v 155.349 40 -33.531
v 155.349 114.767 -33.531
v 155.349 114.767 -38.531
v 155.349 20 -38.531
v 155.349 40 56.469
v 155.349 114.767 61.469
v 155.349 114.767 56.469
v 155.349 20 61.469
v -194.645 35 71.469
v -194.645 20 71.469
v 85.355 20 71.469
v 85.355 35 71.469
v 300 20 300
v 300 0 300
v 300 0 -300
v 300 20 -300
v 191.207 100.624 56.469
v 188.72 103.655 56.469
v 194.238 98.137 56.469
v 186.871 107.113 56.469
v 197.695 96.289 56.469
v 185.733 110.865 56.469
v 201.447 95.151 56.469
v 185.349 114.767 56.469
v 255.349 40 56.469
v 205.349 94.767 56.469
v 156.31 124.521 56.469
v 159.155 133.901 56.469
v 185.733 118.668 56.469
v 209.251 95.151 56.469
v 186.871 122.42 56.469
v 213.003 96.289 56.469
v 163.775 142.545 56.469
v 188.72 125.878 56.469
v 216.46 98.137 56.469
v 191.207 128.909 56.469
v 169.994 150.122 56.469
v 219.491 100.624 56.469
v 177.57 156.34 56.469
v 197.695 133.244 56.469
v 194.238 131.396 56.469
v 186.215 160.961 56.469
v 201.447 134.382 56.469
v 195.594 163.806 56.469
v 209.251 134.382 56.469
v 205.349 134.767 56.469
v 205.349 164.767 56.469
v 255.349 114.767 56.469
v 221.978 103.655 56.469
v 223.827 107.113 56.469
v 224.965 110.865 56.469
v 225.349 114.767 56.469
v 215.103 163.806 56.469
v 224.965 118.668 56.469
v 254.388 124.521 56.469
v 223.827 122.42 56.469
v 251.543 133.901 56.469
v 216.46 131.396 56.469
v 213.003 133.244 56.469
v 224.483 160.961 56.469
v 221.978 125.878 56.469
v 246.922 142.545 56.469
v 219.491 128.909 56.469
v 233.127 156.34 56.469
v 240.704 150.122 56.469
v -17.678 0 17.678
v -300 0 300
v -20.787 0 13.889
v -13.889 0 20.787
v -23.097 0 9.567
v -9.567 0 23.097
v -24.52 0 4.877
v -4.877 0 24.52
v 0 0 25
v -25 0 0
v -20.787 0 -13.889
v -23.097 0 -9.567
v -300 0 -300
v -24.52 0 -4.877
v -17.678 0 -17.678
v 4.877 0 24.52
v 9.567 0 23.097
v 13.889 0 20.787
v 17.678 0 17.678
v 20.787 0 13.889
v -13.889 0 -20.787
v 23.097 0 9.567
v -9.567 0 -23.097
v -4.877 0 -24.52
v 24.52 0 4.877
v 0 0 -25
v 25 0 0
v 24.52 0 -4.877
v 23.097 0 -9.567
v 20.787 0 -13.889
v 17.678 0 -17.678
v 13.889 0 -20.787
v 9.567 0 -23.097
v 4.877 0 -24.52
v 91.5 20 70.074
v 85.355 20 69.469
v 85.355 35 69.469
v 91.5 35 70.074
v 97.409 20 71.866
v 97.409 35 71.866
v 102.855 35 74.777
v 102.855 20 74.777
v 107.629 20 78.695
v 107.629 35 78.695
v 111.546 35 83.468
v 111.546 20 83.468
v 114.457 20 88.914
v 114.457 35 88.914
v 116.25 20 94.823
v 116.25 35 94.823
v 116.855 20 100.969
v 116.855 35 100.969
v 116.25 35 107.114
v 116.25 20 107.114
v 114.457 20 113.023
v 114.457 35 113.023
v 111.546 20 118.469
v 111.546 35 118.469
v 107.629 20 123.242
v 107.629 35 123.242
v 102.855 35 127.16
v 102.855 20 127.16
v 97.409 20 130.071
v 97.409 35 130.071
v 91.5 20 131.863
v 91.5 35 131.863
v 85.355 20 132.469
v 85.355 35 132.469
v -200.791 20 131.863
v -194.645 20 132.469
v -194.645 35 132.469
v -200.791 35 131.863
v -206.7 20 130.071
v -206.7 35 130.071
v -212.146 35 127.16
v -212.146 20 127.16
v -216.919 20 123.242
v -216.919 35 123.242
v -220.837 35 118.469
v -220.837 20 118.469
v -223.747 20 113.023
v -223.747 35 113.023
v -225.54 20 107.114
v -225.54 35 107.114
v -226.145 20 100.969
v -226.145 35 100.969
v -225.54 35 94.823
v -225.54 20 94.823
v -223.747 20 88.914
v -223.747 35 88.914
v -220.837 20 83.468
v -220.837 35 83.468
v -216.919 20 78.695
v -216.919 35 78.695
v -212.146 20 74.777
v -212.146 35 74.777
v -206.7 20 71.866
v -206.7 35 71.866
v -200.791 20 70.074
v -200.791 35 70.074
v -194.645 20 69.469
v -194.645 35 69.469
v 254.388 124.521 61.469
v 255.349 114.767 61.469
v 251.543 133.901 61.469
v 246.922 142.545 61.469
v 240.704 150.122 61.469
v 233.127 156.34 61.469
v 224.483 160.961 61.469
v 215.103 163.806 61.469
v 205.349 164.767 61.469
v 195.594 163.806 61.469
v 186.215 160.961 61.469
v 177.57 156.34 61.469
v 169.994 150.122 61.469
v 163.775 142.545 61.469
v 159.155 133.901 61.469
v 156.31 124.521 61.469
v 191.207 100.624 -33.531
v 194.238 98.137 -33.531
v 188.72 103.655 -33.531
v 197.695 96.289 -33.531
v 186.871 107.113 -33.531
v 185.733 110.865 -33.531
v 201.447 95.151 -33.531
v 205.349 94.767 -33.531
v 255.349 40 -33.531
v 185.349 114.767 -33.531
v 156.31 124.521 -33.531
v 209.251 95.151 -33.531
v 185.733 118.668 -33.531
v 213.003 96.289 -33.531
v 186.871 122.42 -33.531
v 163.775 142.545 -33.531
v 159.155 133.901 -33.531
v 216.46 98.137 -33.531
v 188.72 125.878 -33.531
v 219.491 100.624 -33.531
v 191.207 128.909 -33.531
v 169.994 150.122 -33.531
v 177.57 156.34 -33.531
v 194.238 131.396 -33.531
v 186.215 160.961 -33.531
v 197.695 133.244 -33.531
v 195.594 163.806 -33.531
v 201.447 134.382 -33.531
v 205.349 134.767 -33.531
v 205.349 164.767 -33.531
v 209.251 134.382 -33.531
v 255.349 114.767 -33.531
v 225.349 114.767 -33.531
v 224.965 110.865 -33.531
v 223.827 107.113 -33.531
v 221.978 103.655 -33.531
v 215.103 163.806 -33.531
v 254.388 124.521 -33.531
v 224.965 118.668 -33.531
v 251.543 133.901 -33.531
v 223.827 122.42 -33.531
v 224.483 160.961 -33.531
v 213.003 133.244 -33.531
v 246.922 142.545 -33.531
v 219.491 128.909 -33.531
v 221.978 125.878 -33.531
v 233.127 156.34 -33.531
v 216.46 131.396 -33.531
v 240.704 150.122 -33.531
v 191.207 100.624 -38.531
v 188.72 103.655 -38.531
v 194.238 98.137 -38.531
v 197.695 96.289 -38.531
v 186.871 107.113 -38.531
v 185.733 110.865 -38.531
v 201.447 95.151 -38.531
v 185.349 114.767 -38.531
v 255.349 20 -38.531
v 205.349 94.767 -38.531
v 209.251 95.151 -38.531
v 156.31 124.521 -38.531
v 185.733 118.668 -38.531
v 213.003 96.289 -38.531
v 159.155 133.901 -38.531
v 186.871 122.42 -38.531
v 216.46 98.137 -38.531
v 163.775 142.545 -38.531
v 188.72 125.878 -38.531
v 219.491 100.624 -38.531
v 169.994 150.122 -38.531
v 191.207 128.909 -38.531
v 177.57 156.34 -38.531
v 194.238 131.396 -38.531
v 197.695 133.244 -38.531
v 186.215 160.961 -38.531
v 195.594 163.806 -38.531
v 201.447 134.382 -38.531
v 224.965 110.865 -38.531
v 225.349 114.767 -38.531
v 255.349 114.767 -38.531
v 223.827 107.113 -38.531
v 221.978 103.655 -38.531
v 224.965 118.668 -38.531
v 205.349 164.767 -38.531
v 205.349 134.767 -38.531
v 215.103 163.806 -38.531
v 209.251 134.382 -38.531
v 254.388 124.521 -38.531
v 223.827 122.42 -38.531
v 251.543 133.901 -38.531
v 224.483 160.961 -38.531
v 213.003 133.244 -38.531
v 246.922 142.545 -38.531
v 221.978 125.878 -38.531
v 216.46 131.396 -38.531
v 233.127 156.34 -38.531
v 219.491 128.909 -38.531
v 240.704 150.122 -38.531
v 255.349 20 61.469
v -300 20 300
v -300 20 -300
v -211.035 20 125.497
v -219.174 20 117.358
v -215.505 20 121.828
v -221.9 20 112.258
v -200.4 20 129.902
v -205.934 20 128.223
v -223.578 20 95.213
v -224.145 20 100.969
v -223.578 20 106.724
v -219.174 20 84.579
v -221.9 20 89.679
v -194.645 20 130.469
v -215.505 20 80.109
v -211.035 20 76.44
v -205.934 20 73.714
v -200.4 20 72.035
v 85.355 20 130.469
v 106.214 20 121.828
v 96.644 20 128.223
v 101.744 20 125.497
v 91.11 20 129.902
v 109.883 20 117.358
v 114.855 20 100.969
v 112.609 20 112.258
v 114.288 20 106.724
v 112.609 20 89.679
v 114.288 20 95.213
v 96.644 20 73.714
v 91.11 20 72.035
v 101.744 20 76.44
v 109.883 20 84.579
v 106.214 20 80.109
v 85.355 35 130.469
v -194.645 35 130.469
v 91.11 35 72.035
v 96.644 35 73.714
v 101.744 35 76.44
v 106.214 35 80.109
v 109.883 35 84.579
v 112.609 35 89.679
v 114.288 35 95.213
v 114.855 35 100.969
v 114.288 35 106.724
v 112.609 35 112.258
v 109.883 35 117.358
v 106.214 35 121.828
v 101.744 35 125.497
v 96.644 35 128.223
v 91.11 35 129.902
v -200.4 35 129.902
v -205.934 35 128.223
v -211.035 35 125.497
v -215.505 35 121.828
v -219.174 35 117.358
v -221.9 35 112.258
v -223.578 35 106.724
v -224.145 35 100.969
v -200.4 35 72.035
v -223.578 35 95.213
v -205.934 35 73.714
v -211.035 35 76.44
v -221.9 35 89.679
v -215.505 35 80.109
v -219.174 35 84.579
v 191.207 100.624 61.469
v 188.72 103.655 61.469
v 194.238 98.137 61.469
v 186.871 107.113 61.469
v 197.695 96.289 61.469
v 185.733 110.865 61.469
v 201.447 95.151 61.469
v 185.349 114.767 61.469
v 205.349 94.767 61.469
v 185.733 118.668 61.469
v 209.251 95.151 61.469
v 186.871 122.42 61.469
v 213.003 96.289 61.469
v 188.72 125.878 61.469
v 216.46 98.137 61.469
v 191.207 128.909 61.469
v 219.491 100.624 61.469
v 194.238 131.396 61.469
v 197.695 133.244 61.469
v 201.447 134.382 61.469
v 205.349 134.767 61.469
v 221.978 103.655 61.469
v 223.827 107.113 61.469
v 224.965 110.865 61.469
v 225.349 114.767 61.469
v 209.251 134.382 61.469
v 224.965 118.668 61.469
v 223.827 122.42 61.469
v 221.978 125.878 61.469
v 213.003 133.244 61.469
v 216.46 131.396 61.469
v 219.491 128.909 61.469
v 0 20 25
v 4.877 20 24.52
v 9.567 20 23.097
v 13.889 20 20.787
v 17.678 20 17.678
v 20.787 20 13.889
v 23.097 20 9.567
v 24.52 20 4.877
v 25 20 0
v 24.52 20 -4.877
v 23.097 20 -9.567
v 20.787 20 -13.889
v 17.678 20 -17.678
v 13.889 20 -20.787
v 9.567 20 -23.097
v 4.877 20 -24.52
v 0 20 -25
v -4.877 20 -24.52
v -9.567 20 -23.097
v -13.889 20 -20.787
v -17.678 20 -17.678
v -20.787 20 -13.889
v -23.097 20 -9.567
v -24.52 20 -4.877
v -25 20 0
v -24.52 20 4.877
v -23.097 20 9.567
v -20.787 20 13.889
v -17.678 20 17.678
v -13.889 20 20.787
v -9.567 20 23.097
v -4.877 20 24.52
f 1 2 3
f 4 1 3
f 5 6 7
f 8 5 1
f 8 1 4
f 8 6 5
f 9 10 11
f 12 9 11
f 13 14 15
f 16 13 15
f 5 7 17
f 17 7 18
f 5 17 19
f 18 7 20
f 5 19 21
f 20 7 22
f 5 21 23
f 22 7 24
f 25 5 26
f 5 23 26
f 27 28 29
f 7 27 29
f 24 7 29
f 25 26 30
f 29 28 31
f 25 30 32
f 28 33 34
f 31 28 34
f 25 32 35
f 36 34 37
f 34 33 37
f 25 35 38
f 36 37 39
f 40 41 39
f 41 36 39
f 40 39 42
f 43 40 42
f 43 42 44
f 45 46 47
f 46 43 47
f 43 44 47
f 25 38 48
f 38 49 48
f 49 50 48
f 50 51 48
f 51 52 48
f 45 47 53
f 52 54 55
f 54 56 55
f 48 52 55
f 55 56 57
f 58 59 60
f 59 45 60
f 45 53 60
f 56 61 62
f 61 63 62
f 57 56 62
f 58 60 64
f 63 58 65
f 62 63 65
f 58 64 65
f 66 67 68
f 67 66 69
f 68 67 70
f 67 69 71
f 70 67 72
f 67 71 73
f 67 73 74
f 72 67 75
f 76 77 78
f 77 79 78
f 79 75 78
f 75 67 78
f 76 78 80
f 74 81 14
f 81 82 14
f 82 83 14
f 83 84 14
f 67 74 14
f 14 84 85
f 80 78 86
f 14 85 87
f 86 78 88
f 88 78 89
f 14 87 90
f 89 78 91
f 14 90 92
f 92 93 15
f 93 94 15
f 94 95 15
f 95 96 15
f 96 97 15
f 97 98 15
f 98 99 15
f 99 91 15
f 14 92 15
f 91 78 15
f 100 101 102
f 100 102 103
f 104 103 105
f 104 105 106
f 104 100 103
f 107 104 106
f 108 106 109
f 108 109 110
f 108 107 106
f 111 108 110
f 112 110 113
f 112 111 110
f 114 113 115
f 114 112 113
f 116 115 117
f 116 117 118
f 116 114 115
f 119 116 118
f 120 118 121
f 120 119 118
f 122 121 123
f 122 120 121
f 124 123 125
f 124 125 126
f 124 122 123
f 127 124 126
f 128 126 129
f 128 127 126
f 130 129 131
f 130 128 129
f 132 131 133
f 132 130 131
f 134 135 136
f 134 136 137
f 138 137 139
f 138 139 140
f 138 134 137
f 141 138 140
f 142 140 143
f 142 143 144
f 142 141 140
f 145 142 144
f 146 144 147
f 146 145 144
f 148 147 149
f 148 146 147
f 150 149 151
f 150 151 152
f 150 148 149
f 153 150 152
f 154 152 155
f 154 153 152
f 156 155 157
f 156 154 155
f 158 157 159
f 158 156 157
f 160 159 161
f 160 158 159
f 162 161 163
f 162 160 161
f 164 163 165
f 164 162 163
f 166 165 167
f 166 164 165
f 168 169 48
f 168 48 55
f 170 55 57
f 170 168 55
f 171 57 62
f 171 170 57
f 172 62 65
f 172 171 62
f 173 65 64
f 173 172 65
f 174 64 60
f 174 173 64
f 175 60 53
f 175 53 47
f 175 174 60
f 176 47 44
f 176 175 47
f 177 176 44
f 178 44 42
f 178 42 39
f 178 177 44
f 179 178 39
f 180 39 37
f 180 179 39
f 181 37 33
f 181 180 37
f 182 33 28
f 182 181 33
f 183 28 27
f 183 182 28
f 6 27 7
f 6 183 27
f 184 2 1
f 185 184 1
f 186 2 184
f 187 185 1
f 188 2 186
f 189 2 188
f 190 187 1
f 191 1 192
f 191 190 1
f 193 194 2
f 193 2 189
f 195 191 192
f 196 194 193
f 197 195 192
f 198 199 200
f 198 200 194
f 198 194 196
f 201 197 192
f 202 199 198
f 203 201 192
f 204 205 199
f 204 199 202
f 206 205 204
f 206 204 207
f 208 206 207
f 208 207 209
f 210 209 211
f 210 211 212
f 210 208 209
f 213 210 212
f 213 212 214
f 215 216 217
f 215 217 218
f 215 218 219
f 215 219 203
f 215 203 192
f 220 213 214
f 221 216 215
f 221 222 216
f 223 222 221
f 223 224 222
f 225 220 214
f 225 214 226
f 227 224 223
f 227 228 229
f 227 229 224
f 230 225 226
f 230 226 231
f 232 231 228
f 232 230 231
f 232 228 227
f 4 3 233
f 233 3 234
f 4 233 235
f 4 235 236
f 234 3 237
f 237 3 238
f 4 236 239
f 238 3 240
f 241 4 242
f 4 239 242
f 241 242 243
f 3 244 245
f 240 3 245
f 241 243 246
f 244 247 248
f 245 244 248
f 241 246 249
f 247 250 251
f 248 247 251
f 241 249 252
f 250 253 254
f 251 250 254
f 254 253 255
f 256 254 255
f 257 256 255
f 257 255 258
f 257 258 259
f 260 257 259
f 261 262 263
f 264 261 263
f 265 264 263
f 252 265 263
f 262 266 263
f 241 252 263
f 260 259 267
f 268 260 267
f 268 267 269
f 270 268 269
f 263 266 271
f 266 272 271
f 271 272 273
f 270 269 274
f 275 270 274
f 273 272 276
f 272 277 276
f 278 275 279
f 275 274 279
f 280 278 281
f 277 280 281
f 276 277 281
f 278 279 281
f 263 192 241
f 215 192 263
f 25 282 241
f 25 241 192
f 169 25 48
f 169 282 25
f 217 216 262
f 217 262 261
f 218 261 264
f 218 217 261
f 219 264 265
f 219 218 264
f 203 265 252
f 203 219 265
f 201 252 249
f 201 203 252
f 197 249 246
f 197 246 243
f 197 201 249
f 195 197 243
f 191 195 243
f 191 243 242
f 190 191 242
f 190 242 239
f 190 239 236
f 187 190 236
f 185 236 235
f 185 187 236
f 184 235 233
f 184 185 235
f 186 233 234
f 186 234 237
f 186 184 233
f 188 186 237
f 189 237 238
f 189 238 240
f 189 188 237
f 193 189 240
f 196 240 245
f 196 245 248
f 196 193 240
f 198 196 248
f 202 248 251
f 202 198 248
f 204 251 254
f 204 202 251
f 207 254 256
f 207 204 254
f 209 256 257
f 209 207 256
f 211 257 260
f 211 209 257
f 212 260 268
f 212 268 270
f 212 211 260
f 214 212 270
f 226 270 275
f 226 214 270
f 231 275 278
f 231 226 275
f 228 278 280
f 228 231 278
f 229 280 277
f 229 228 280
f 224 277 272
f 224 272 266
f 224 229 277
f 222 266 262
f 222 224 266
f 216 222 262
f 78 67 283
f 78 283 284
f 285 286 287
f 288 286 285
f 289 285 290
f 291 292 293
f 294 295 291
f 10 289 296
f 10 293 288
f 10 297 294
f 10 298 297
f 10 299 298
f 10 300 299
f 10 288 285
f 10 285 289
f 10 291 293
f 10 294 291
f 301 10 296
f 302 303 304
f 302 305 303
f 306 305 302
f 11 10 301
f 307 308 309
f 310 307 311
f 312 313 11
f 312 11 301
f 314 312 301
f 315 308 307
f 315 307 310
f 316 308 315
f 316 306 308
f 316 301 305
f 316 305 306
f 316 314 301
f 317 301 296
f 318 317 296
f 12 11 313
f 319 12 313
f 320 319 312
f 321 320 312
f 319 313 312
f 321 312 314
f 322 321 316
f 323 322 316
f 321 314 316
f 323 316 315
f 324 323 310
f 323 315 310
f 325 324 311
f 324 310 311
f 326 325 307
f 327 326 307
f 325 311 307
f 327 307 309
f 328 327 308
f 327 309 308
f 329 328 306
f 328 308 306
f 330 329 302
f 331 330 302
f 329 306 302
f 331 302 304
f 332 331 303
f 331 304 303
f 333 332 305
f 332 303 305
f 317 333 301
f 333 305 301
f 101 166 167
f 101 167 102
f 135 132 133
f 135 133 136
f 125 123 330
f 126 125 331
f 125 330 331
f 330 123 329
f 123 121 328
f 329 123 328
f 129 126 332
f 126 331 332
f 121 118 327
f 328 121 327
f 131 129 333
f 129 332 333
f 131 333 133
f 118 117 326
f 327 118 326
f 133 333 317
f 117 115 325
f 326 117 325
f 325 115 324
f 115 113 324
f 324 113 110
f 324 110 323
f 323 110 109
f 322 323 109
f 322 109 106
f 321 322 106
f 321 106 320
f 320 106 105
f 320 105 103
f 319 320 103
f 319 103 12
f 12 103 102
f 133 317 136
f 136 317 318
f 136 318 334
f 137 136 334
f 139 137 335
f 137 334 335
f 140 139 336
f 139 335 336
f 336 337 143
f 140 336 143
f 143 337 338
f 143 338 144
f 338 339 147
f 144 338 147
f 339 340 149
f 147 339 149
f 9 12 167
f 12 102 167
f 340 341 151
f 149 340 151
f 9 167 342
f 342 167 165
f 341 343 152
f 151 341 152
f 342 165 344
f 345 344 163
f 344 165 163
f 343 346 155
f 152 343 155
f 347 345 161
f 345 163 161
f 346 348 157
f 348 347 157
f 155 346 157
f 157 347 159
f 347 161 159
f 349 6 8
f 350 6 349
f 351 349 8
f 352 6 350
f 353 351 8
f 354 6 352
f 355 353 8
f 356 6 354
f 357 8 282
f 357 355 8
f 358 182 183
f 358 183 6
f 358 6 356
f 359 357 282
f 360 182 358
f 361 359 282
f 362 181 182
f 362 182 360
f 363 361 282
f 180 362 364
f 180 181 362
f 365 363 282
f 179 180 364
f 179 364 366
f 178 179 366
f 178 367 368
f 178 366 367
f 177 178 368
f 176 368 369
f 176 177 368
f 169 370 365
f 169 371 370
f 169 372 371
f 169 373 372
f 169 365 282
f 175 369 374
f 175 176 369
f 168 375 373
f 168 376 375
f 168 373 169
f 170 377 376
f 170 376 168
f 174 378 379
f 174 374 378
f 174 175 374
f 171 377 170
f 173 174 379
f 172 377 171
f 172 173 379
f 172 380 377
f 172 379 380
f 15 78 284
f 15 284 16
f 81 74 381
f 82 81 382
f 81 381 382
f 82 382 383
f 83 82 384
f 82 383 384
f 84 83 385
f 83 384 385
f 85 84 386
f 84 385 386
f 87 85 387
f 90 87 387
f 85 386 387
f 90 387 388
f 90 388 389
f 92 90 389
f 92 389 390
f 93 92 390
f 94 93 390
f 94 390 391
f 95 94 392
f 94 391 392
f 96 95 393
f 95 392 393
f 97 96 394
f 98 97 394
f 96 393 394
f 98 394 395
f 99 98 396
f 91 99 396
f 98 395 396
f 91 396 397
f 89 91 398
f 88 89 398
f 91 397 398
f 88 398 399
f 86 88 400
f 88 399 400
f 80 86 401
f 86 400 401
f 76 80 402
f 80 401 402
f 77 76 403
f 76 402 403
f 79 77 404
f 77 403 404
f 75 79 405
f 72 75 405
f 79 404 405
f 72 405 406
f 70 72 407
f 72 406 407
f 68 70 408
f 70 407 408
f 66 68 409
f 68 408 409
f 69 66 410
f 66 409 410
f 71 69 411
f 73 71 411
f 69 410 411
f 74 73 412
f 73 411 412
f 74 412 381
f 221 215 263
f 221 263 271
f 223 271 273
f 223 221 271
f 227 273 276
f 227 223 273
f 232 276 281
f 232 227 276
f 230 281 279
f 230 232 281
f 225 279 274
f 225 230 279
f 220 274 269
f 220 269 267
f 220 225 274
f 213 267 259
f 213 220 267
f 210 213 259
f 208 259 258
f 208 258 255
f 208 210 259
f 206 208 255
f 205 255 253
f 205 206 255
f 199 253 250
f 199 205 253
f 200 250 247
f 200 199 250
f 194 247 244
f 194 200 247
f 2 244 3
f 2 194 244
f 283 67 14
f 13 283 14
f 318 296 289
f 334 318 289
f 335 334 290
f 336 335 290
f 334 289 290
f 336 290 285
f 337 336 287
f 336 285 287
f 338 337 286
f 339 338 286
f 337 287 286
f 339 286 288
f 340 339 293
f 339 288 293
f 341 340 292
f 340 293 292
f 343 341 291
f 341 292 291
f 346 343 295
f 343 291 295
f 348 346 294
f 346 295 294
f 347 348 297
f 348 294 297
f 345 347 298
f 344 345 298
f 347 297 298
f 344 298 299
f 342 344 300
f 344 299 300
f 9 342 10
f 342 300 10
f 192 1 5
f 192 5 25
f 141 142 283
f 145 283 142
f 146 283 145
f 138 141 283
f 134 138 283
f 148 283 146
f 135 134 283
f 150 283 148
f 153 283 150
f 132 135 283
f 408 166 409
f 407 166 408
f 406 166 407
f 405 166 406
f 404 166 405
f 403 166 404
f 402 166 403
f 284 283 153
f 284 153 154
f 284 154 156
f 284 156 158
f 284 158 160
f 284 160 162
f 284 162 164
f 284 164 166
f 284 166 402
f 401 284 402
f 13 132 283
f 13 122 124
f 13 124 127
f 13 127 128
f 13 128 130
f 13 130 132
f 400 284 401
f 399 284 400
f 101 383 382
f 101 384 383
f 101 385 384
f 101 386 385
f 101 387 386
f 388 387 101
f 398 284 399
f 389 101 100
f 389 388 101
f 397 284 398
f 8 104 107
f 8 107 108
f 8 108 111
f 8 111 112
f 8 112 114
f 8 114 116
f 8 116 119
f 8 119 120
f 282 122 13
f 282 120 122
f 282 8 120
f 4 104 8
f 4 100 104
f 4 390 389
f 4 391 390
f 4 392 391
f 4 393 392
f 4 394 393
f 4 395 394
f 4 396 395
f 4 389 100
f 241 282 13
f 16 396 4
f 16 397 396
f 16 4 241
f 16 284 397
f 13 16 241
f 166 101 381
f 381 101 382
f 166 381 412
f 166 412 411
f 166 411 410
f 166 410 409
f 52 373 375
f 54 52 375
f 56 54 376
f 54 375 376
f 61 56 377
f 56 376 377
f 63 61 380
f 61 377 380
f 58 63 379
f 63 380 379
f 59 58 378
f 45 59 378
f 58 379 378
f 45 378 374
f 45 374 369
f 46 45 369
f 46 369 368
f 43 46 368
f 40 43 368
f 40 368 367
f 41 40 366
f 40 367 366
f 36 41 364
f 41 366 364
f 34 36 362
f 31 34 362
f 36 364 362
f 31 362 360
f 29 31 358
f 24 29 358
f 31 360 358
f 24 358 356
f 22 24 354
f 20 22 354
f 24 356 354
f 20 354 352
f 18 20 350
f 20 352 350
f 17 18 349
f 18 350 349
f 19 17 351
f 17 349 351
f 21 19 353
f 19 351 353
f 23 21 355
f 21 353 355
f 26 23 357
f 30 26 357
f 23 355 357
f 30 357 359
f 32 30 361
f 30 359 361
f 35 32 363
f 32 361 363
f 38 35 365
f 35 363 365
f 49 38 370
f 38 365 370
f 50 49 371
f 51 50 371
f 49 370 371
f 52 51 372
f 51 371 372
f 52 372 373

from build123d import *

# Parameters (mm, degrees)
SKETCH_1_W          = 600
SKETCH_1_H          = 600
EXTRUDE_1_DEPTH     = 20
SKETCH_2_W          = 100
SKETCH_2_H          = 100
EXTRUDE_2_DEPTH     = 20
SKETCH_3_R          = 20
EXTRUDE_3_DEPTH     = 5
EXTRUDE_START       = -5
SKETCH_5_R          = 20
EXTRUDE_4_DEPTH     = 5
EXTRUDE_1_2_DEPTH   = 15
SKETCH_7_R          = 25
CUT_EXTRUDE_1_DEPTH = 20


with BuildPart() as part:
    # 草图1 → Extrude 1 (new body)
    with BuildSketch(Plane(origin=(0, 0, 0), x_dir=(1, 0, 0), z_dir=(0, 1, 0))):
        Rectangle(SKETCH_1_W, SKETCH_1_H)
    extrude(amount=EXTRUDE_1_DEPTH)

    # 草图2 → 凸台-拉伸2 (add)
    with BuildSketch(Plane(origin=(0, 20, 0), x_dir=(1, 0, 0), z_dir=(0, 1, 0))):
        with Locations((205.348971612, -11.468548329)):
            Rectangle(SKETCH_2_W, SKETCH_2_H)
    extrude(amount=EXTRUDE_2_DEPTH)

    # 草图3 → 凸台-拉伸3 (add)
    with BuildSketch(Plane.XY.offset(61.468548329)):
        with BuildLine():
            Line((255.348971612, 40), (255.348971612, 114.766543298))
            ThreePointArc((255.348971612, 114.766543298), (205.348971612, 164.766543298), (155.348971612, 114.766543298))
            Line((155.348971612, 114.766543298), (155.348971612, 40))
            Line((155.348971612, 40), (255.348971612, 40))
        make_face()
        with Locations((205.348971612, 114.766543298)):
            Circle(SKETCH_3_R, mode=Mode.SUBTRACT)
    extrude(amount=-EXTRUDE_3_DEPTH)

    # 草图5 → 凸台-拉伸4 (add)
    with BuildSketch(Plane(origin=(0, 0, -38.531451671), x_dir=(-1, 0, 0), z_dir=(0, 0, -1)).offset(EXTRUDE_START)):
        with BuildLine():
            ThreePointArc((-255.348971612, 114.766543298), (-205.348971612, 164.766543298), (-155.348971612, 114.766543298))
            Line((-155.348971612, 114.766543298), (-155.348971612, 40))
            Line((-155.348971612, 40), (-255.348971612, 40))
            Line((-255.348971612, 40), (-255.348971612, 114.766543298))
        make_face()
        with Locations(Location((-205.348971612, 114.766543298, 0), (0, 0, 180))):
            Circle(SKETCH_5_R, mode=Mode.SUBTRACT)
    extrude(amount=EXTRUDE_4_DEPTH)

    # 草图6 → Extrude 1 2 (add)
    with BuildSketch(Plane(origin=(0, 20, 0), x_dir=(1, 0, 0), z_dir=(0, 1, 0))):
        with BuildLine():
            Line((-194.645221659, -69.468548329), (85.354778341, -69.468548329))
            ThreePointArc((85.354778341, -69.468548329), (116.854778341, -100.968548329), (85.354778341, -132.468548329))
            Line((85.354778341, -132.468548329), (-194.645221659, -132.468548329))
            ThreePointArc((-194.645221659, -132.468548329), (-226.145221659, -100.968548329), (-194.645221659, -69.468548329))
        make_face()
        with BuildLine():
            Line((-194.645221659, -71.468548329), (85.354778341, -71.468548329))
            ThreePointArc((85.354778341, -71.468548329), (114.854778341, -100.968548329), (85.354778341, -130.468548329))
            Line((85.354778341, -130.468548329), (-194.645221659, -130.468548329))
            ThreePointArc((-194.645221659, -130.468548329), (-224.145221659, -100.968548329), (-194.645221659, -71.468548329))
        make_face(mode=Mode.SUBTRACT)
    extrude(amount=EXTRUDE_1_2_DEPTH)

    # 草图7 → 切除-拉伸1 (cut)
    with BuildSketch(Plane(origin=(0, 20, 0), x_dir=(1, 0, 0), z_dir=(0, 1, 0))):
        with Locations(Location((0, 0, 0), (0, 0, 270))):
            Circle(SKETCH_7_R)
    extrude(amount=-CUT_EXTRUDE_1_DEPTH, mode=Mode.SUBTRACT)


solid = part.part
